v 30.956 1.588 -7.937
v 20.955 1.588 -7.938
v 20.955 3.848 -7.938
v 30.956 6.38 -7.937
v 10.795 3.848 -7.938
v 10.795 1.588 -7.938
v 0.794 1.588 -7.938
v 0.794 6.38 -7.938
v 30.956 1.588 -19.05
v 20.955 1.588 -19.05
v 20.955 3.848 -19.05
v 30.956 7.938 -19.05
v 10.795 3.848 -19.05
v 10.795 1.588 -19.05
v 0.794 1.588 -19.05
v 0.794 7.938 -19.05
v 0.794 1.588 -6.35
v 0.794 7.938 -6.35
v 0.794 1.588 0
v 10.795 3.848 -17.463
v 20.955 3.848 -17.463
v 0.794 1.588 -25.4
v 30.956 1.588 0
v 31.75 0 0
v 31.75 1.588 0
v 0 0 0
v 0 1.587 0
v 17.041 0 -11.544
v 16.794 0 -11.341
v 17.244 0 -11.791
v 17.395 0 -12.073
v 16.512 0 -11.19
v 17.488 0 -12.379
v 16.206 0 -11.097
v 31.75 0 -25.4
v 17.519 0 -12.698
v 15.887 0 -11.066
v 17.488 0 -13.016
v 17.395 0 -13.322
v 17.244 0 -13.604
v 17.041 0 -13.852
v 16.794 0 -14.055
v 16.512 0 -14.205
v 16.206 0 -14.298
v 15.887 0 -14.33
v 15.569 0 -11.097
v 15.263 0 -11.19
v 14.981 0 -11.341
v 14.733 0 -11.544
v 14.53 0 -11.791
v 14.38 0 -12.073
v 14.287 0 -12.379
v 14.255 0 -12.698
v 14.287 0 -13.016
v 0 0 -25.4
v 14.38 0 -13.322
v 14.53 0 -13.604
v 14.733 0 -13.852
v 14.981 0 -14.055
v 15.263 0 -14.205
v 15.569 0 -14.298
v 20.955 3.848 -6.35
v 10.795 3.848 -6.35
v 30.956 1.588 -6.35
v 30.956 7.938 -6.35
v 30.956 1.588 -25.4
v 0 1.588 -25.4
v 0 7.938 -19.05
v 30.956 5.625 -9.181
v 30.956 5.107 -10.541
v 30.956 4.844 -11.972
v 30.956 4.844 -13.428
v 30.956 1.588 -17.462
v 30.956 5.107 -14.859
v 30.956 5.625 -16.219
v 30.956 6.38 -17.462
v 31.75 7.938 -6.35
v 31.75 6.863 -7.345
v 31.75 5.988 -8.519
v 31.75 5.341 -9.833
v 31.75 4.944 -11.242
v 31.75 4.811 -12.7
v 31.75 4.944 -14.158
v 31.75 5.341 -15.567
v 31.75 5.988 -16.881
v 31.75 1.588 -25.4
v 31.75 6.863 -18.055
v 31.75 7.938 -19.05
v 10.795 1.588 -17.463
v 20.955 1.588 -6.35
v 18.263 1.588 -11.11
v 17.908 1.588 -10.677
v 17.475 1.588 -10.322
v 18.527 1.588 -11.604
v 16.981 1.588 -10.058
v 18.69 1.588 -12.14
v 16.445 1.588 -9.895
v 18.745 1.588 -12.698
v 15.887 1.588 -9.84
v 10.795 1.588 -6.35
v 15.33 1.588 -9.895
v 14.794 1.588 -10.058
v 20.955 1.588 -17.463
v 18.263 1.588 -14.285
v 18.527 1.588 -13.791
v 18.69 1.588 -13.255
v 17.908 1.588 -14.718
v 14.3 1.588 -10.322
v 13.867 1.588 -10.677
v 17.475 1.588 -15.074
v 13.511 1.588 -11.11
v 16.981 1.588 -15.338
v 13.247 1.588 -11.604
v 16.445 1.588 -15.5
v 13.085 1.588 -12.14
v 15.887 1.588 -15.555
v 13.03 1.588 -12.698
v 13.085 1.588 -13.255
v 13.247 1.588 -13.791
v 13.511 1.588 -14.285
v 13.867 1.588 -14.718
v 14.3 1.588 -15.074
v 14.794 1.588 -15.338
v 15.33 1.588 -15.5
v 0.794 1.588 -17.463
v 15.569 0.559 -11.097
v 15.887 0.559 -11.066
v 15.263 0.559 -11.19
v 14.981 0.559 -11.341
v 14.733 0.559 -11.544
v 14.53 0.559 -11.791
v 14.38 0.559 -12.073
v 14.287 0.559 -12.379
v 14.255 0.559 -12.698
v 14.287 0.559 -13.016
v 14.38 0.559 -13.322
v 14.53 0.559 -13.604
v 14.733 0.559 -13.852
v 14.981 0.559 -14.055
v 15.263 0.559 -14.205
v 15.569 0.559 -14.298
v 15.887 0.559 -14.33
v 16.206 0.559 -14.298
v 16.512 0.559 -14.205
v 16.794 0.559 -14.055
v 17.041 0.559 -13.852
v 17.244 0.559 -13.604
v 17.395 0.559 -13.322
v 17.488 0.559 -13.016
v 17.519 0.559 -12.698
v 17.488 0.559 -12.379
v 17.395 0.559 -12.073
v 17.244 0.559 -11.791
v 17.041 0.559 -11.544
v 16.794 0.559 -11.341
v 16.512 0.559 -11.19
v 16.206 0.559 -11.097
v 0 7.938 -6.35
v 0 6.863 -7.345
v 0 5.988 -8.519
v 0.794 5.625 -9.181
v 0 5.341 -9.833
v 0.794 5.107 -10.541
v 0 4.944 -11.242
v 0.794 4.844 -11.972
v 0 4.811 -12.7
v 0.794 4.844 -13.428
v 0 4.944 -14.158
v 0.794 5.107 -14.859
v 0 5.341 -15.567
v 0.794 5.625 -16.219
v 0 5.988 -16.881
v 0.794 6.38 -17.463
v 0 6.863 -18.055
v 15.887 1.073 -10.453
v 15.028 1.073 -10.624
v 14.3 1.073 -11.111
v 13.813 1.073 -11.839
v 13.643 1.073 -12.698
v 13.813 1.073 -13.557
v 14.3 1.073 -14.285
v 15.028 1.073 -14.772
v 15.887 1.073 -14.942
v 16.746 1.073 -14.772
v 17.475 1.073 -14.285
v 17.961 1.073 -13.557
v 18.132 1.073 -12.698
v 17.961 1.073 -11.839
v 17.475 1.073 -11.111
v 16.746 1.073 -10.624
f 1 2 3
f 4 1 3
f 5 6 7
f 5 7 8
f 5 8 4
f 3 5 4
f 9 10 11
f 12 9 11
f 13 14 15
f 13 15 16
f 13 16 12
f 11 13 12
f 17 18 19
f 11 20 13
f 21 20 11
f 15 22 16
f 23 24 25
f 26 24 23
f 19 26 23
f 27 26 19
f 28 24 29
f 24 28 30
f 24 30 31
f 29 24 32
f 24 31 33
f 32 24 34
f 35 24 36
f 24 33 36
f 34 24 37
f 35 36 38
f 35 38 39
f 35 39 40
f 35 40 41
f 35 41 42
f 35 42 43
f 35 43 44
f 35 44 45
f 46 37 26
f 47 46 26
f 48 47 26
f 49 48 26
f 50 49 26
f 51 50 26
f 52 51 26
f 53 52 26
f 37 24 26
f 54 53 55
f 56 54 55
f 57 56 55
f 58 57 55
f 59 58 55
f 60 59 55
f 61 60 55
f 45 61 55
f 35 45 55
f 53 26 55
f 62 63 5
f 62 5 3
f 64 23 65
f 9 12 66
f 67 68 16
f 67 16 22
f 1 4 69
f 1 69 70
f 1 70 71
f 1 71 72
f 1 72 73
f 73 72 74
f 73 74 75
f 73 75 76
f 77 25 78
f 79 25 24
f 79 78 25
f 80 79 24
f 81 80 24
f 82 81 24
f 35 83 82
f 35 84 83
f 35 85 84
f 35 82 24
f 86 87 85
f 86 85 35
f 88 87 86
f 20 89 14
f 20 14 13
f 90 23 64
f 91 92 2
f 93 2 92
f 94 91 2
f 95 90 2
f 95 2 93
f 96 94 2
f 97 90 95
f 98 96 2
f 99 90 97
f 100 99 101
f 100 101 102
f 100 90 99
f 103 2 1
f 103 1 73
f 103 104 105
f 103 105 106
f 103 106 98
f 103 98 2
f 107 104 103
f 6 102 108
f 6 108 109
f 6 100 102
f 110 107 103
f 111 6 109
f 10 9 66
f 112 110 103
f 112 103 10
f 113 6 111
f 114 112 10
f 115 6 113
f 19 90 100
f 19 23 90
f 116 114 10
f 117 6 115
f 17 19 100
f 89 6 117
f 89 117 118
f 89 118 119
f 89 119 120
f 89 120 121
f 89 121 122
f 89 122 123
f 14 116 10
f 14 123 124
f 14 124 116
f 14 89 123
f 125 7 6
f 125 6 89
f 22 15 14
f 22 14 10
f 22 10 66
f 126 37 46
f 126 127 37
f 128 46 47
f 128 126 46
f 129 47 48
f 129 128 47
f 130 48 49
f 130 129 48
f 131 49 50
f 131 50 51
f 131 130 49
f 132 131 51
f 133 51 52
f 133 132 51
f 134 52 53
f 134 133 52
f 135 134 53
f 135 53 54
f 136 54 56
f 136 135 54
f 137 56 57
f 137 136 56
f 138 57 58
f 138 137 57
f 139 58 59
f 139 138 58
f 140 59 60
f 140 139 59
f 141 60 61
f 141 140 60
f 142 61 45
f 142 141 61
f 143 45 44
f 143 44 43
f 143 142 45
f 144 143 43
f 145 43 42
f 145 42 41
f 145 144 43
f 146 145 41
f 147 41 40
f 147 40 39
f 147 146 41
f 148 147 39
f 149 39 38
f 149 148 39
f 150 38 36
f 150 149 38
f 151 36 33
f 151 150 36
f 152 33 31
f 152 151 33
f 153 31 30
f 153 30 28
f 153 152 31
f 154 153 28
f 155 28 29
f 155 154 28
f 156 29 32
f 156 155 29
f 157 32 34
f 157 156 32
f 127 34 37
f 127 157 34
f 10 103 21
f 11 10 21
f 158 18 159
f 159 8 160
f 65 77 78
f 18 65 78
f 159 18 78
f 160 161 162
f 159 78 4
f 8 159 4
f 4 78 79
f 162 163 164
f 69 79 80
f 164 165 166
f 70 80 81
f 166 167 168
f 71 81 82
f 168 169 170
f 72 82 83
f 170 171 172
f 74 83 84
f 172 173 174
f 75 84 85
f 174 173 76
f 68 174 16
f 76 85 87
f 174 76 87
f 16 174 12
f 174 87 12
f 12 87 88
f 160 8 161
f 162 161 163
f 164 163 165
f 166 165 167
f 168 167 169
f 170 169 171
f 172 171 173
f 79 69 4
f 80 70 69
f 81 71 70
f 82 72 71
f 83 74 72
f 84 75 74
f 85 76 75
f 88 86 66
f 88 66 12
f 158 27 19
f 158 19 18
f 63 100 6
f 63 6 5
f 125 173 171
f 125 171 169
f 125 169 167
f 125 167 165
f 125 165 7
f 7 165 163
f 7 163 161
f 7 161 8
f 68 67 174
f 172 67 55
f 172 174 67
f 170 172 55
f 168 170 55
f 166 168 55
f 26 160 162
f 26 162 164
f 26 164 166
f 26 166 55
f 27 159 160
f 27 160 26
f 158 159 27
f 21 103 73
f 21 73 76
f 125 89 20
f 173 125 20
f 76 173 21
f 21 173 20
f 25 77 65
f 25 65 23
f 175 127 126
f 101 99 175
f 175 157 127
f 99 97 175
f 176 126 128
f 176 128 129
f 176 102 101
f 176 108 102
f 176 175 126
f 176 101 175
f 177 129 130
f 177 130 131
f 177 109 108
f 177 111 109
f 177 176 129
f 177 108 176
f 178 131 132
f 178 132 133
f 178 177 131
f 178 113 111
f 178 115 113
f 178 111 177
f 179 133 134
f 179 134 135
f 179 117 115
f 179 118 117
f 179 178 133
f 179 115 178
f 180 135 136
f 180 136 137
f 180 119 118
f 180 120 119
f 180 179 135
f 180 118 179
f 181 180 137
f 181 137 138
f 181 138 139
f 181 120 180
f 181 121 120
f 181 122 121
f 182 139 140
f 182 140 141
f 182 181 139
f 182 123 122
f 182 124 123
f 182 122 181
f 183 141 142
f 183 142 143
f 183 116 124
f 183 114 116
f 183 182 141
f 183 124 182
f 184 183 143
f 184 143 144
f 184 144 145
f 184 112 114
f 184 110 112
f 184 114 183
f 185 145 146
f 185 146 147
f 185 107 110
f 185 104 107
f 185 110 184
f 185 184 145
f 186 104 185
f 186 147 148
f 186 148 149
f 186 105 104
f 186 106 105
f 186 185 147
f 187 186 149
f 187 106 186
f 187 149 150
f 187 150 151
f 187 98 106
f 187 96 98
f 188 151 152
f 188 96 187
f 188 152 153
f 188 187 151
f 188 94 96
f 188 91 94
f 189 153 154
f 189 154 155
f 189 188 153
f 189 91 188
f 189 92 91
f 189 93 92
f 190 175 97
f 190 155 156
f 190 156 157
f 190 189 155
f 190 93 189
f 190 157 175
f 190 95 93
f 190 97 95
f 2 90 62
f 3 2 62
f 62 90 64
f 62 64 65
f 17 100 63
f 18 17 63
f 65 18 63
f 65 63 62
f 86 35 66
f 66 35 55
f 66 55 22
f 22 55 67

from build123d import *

# Parameters (mm, degrees)
SKETCH4_W           = 25.4
SKETCH4_H           = 1.5875
SKETCH4_W_2         = 1.5875
SKETCH4_H_2         = 6.35
BOSS_EXTRUDE2_DEPTH = 31.75
SKETCH5_W           = 9.525
SKETCH5_H           = 6.35
BOSS_EXTRUDE3_DEPTH = 0.79375
BOSS_EXTRUDE4_DEPTH = 0.79375
SKETCH7_W           = 10.16
SKETCH7_H           = 2.260476196
CUT_EXTRUDE1_DEPTH  = 38.867781903
CUT_EXTRUDE2_REACH  = 43.427
SKETCH8_R           = 8.011204241


with BuildPart() as part:
    # Sketch4 → Boss-Extrude2 (new body)
    with BuildSketch(Plane(origin=(0, 0, 0), x_dir=(0, 0, -1), z_dir=(1, 0, 0))):
        with Locations((12.7, 0.79375)):
            Rectangle(SKETCH4_W, SKETCH4_H)
        with Locations((7.14375, 4.7625)):
            Rectangle(SKETCH4_W_2, SKETCH4_H_2)
        with Locations((18.25625, 4.7625)):
            Rectangle(SKETCH4_W_2, SKETCH4_H_2)
    extrude(amount=BOSS_EXTRUDE2_DEPTH)

    # Sketch5 → Boss-Extrude3 (add)
    with BuildSketch(Plane(origin=(31.75, 0, 0), x_dir=(0, 0, -1), z_dir=(1, 0, 0))):
        Polygon((6.35, 7.9375), (0, 1.5875), (6.35, 1.5875), align=None)
        with Locations((12.7, 4.7625)):
            Rectangle(SKETCH5_W, SKETCH5_H)
        Polygon((19.05, 7.9375), (19.05, 1.5875), (25.4, 1.5875), align=None)
    extrude(amount=-BOSS_EXTRUDE3_DEPTH)

    # Sketch6 → Boss-Extrude4 (add)
    with BuildSketch(Plane.ZY):
        Polygon((-25.4, 1.5875), (0, 1.5875), (-6.35, 7.9375), (-19.05, 7.9375), align=None)
    extrude(amount=-BOSS_EXTRUDE4_DEPTH)

    # Sketch7 → Cut-Extrude1 (cut, through all)
    with BuildSketch(Plane.XY.offset(-6.35)):
        with Locations((15.875, 2.717738098)):
            Rectangle(SKETCH7_W, SKETCH7_H)
    extrude(amount=-CUT_EXTRUDE1_DEPTH, mode=Mode.SUBTRACT)

    # Sketch8 → Cut-Extrude2 (cut, up to next)
    with BuildSketch(Plane(origin=(31.75, 0, 0), x_dir=(0, 0, -1), z_dir=(1, 0, 0)), mode=Mode.PRIVATE) as cut_extrude2_sk1:
        with Locations((12.7, 12.82185189)):
            Circle(SKETCH8_R)
    cut_extrude2_tool1 = extrude(cut_extrude2_sk1.sketch, amount=-CUT_EXTRUDE2_REACH, mode=Mode.PRIVATE) & part.part
    add(cut_extrude2_tool1.solids().sort_by_distance((31.75, 12.821852, -12.7))[0], mode=Mode.SUBTRACT)

    # Sketch10 → CSK for #4 Flat Head Machine Screw (100)1 (revolve, cut)
    with BuildSketch(Plane(origin=(15.887282669, 1.5875, -12.697770178), x_dir=(0, 0, 1), z_dir=(1, 0, 0))):
        Polygon((0, 0), (0, 1.5875), (1.63195, 1.5875), (1.63195, 1.028358553), (2.8575, 0), align=None)
    revolve(axis=Axis((15.887282669, 7.9375, -12.697770178), (0, -1, 0)), mode=Mode.SUBTRACT)


solid = part.part
